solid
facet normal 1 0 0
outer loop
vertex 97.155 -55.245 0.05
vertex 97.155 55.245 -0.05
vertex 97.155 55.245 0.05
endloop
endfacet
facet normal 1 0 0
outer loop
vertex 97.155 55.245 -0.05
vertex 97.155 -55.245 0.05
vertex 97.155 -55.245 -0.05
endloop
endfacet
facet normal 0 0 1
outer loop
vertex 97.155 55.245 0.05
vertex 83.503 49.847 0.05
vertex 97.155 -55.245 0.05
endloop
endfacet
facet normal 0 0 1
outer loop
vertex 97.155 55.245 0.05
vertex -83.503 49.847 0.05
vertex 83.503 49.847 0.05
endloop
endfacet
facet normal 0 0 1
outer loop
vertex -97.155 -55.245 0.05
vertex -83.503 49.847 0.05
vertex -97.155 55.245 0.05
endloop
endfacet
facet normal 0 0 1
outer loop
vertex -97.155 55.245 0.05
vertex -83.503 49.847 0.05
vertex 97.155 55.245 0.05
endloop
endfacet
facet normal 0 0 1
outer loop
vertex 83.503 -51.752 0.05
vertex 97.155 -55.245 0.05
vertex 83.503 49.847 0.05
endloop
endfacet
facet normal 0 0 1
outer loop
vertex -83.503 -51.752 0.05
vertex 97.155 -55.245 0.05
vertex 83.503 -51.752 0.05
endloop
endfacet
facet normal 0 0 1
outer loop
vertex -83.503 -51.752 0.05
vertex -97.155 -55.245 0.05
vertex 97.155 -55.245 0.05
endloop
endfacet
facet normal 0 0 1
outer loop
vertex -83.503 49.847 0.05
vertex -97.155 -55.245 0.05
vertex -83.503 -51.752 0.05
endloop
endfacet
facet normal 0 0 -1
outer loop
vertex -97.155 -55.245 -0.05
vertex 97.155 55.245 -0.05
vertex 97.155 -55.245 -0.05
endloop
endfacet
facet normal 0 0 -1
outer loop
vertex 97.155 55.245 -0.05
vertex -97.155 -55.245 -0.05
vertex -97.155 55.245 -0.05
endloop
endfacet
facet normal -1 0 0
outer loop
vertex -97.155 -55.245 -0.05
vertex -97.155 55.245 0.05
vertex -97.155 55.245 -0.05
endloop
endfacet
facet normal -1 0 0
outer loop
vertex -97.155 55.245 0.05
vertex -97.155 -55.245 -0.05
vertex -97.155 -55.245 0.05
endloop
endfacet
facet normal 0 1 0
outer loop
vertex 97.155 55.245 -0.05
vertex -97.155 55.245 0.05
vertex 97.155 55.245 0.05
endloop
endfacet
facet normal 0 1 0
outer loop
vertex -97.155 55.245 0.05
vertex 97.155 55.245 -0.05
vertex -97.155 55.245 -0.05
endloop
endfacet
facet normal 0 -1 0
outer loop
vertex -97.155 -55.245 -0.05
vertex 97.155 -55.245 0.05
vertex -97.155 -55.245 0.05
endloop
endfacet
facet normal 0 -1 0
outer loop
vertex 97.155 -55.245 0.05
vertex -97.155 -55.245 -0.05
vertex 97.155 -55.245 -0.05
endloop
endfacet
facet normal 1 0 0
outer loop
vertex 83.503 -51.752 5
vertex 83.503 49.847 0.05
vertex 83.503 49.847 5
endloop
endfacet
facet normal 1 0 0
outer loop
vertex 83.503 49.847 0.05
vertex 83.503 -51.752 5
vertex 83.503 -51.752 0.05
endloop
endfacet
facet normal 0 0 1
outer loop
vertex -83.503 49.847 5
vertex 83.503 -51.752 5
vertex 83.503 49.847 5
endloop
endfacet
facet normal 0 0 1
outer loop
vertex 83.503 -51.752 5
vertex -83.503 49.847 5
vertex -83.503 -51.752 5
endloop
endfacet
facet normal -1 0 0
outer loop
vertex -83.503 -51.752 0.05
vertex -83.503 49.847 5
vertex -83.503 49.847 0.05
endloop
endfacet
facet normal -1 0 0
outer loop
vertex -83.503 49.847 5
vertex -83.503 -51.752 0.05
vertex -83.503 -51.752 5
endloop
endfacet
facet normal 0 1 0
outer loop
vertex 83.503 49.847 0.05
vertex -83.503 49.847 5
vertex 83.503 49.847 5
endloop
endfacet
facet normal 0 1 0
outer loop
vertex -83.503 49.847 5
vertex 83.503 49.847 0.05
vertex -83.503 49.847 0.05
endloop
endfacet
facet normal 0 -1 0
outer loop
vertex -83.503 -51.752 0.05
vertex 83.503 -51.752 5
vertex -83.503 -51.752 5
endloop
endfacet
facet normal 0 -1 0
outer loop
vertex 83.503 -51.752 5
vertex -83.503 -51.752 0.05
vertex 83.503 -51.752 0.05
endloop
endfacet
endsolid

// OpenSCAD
in=25.4;

screen();

module screen(){
    //the screen proper
    cube([7.65*in, 4.35*in, .1], center=true);
    
    //mounting plate
    translate([0,-.075*in/2,5/2]) cube([6.575*in, 4*in, 5], center=true);
    
    //screw nubs
    translate([0,-.075*in/2,5/2-.1]) for(i=[0,1]) for(j=[0,1]) mirror([i,0,0]) mirror([0,j,0]) translate([126/2, 66/2,0]) {
    }
}
